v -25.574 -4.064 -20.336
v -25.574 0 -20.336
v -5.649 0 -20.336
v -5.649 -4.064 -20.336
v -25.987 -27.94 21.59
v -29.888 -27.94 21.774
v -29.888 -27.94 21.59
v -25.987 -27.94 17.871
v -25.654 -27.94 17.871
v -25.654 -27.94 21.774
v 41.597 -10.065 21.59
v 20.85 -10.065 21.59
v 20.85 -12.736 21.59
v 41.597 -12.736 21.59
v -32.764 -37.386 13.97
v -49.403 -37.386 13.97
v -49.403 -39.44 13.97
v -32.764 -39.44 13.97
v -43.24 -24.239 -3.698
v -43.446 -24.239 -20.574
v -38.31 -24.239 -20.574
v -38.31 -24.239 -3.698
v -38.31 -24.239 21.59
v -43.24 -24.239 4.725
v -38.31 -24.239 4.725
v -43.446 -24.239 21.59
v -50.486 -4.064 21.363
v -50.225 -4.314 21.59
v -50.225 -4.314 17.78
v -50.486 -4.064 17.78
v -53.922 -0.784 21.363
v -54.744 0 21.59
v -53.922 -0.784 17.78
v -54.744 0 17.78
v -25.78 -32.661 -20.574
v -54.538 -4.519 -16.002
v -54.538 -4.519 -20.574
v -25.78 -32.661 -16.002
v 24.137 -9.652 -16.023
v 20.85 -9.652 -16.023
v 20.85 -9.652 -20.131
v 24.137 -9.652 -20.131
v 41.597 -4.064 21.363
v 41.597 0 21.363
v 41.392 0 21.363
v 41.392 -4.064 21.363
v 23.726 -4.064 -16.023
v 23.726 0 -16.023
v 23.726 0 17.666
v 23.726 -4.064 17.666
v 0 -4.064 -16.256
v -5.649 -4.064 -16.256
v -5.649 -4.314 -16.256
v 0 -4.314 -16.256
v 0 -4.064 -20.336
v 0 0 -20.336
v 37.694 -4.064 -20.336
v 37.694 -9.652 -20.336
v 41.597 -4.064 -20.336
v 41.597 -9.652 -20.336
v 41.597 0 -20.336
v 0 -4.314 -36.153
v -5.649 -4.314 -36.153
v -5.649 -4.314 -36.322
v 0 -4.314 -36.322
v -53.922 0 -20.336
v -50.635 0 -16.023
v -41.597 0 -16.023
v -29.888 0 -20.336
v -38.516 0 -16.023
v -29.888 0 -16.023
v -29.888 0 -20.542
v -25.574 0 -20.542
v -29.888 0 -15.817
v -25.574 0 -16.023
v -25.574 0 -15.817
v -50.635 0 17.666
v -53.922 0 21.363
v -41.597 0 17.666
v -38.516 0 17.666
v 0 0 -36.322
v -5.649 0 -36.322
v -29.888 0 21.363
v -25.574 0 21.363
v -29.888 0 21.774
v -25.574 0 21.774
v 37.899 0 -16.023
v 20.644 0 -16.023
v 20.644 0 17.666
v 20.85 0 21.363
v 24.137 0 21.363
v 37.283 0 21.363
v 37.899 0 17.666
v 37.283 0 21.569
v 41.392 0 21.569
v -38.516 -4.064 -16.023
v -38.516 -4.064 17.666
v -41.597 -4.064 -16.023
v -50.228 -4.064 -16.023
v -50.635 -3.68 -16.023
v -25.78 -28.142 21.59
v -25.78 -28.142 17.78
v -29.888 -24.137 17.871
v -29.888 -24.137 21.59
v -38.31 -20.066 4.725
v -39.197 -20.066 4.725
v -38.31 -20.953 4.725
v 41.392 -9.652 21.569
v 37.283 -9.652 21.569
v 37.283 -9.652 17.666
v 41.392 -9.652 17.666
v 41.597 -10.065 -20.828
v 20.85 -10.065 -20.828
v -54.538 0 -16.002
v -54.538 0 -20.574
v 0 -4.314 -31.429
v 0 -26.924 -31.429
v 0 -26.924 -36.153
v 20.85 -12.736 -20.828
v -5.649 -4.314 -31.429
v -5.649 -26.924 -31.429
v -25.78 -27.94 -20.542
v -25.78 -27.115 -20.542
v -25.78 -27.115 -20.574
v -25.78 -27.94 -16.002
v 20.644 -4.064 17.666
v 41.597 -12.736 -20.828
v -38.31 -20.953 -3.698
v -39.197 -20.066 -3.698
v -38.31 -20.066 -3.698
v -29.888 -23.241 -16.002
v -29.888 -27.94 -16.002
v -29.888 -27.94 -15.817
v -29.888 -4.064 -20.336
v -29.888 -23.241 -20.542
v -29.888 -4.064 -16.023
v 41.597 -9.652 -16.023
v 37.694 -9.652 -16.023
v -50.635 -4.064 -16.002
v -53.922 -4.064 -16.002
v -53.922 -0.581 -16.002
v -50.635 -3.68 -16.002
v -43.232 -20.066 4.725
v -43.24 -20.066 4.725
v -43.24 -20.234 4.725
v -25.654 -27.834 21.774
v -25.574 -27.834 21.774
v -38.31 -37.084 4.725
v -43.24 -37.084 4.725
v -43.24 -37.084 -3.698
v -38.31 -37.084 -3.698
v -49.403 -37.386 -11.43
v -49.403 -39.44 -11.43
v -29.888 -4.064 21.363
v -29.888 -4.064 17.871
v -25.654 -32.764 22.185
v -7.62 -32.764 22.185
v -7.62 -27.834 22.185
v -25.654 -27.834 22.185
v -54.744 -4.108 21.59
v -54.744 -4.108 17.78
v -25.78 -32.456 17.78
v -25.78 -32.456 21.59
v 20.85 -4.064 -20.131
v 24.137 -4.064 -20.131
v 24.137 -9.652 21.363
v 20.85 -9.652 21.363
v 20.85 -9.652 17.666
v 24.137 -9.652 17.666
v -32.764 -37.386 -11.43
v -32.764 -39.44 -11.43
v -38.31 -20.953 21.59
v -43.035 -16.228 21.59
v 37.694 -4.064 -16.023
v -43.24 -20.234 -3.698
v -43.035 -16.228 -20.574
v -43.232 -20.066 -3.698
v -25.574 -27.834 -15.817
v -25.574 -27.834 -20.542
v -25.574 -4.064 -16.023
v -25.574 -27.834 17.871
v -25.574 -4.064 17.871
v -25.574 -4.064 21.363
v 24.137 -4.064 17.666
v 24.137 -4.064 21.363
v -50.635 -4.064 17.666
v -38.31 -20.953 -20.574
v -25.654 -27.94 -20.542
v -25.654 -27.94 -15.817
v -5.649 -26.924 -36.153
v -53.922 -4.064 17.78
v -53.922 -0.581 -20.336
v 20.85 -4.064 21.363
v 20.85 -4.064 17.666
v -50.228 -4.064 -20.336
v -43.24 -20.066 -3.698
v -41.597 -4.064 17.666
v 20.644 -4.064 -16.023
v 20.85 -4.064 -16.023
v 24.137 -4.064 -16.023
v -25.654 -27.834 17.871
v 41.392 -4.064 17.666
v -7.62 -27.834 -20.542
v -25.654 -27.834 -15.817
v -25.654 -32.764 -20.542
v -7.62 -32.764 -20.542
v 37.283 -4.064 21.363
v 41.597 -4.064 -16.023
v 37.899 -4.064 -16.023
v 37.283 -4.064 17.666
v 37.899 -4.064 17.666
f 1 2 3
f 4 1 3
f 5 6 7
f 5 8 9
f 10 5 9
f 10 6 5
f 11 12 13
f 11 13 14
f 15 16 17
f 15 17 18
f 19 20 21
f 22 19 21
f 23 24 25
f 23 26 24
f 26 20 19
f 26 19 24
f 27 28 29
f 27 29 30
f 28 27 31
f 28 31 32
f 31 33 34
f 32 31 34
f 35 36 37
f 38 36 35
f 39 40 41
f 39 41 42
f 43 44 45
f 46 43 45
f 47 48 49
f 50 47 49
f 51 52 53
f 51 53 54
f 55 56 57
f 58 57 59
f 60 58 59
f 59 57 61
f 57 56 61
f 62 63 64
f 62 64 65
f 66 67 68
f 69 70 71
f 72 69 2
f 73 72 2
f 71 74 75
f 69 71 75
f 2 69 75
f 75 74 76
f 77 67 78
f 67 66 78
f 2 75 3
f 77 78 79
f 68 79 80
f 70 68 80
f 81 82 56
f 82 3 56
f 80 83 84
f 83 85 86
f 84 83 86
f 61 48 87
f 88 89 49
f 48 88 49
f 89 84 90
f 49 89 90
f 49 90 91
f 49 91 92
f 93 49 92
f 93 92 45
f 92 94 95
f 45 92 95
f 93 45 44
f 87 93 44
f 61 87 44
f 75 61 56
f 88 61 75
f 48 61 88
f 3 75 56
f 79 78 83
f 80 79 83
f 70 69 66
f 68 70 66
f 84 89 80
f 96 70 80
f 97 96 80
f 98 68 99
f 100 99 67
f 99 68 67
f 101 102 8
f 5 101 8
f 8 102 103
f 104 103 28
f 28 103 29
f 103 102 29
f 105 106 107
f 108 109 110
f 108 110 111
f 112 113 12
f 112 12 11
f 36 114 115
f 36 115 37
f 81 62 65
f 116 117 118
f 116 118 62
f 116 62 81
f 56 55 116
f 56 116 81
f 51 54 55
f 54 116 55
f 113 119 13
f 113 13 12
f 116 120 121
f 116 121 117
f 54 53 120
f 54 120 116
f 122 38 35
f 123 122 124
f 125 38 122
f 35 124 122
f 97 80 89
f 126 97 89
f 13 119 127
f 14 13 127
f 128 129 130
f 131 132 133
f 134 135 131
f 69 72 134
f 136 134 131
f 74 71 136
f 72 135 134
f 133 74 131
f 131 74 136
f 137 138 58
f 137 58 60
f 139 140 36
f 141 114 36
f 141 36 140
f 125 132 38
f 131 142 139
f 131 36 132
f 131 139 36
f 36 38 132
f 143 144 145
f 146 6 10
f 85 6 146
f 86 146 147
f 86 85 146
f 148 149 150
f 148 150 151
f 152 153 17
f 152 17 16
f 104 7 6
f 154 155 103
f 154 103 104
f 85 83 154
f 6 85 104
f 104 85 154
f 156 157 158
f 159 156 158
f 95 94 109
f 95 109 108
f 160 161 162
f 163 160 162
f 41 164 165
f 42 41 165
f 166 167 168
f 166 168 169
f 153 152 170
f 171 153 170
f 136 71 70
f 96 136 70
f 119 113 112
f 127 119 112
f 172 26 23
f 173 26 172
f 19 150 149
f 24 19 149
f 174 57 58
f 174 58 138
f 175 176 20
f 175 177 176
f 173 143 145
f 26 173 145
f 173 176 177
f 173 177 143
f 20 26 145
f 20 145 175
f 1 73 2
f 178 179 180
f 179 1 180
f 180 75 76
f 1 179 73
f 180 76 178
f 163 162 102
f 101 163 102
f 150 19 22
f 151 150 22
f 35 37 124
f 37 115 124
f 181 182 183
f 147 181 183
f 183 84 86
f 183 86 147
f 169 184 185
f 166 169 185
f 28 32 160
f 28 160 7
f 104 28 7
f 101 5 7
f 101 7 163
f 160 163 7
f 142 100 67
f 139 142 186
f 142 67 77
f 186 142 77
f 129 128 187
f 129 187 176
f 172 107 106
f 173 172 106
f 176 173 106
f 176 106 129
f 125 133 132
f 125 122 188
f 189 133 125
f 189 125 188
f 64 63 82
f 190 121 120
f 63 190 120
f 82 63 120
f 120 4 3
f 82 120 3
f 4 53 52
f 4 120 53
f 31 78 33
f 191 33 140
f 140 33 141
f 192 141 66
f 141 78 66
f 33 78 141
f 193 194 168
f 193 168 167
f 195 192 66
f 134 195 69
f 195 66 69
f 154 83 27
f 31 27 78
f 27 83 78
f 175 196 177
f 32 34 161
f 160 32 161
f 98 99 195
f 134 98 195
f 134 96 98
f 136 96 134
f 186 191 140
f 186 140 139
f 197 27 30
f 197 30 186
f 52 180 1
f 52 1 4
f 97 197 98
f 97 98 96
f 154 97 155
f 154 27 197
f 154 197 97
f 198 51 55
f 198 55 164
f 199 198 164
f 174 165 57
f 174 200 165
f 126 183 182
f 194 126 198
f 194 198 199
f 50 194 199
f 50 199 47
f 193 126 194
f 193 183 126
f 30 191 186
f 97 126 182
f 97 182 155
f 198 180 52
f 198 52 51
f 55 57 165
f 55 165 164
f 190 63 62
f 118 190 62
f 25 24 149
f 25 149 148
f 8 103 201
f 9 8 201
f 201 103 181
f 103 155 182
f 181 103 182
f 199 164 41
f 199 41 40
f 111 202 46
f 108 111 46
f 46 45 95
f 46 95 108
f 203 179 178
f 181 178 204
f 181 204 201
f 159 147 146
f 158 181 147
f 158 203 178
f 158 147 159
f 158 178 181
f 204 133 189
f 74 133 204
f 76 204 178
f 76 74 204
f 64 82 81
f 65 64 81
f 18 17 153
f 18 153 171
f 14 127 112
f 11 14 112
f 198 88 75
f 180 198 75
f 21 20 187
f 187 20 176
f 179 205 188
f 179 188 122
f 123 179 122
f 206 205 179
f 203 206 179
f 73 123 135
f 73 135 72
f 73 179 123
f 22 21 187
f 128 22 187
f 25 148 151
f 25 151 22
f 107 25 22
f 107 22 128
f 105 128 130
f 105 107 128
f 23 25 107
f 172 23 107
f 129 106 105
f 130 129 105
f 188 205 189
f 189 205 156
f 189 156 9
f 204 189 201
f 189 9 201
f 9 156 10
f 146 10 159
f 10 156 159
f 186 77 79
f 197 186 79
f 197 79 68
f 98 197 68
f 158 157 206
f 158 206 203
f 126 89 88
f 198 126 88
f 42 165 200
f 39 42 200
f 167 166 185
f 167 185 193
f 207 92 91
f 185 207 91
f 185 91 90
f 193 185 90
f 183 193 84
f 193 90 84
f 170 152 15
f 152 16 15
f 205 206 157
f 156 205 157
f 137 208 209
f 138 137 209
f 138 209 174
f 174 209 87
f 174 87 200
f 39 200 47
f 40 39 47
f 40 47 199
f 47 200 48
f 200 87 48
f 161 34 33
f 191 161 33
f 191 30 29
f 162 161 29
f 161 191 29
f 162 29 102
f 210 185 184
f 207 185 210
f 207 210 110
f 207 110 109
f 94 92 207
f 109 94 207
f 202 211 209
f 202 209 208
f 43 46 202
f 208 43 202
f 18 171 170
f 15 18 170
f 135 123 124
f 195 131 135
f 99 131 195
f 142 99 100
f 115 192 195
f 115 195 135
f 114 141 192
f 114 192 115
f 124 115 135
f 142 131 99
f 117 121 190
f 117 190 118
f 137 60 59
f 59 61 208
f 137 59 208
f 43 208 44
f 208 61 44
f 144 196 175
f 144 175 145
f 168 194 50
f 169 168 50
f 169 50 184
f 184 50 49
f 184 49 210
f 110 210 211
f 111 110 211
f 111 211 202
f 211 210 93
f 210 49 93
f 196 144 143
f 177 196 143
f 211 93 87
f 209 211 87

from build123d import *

# Parameters (mm, degrees)
F0_W           = 3.286678344
F0_H           = 16.0225424916
F0_H_2         = 17.6658798009
F0_W_2         = 3.0812583864
F0_W_3         = 3.0812565237
F0_W_4         = 3.6975108087
F1_DEPTH       = 4.064
F2_W           = 4.3137613684
F2_H           = 4.7245956957
F2_H_2         = 3.9029289037
F3_DEPTH       = 27.94
F5_START       = 17.78
F5_DEPTH       = 3.81
F7_START       = -16.002
F7_DEPTH       = 4.572
F9_START       = -7.62
F8_W           = 4.9300119281
F8_H           = 42.7267793566
F9_DEPTH       = 18.034
F10_W          = 3.9029307663
F10_H          = 4.3137613684
F10_W_2        = 4.1083432734
F10_H_2        = 3.9029251784
F10_W_3        = 3.2866764814
F10_H_3        = 3.6975089461
F10_H_4        = 4.1083432734
F11_DEPTH      = 9.652
F12_W          = 20.7471400499
F12_H          = 2.670424059
F13_DEPTH      = 21.59
F13_DEPTH_BACK = 20.828
F15_START      = -16.256
F14_W          = 5.6489729322
F14_H          = 4.3137613684
F15_DEPTH      = 20.066
F16_W          = 5.6489729322
F16_H          = 4.7245956957
F17_DEPTH      = 26.924
F19_DEPTH      = 21.59
F19_DEPTH_BACK = 20.574
F21_START      = 20.066
F20_W          = 4.9300119281
F20_H          = 8.4221053403
F21_DEPTH      = 17.018
F22_W          = 16.6387930512
F22_H          = 2.0541734993
F23_DEPTH      = 13.97
F23_DEPTH_BACK = 11.43


with BuildPart() as f1:
    # F0 (on Front) → F1 (new body)
    with BuildSketch(Plane.XZ):
        Polygon((-53.9220161736, 21.363388747), (-53.9220161736, 17.6658798009), (-50.6353378296, 17.6658798009), (-41.5969826281, 17.6658798009), (-38.5157242417, 17.6658798009), (20.6444300711, 17.6658798009), (23.7256865948, 17.6658798009), (37.8994755447, 17.6658798009), (41.5969863534, 17.6658798009), (41.5969863534, 21.363388747), align=None)
        Polygon((-50.6353378296, -16.0225424916), (-53.9220161736, -16.0225424916), (-53.9220161736, -20.3363038599), (41.5969863534, -20.3363038599), (41.5969863534, -16.0225424916), (37.8994755447, -16.0225424916), (23.7256865948, -16.0225424916), (20.6444300711, -16.0225424916), (-38.5157242417, -16.0225424916), (-41.5969826281, -16.0225424916), align=None)
        with Locations((-52.2786770016, -8.0112712458)):
            Rectangle(F0_W, F0_H)
        with Locations((-52.2786770016, 8.8329399005)):
            Rectangle(F0_W, F0_H_2)
        with Locations((-40.0563534349, 8.8329399005)):
            Rectangle(F0_W_2, F0_H_2)
        with Locations((-40.0563534349, -8.0112712458)):
            Rectangle(F0_W_2, F0_H)
        with Locations((22.185058333, 8.8329399005)):
            Rectangle(F0_W_3, F0_H_2)
        with Locations((22.185058333, -8.0112712458)):
            Rectangle(F0_W_3, F0_H)
        with Locations((39.748230949, -8.0112712458)):
            Rectangle(F0_W_4, F0_H)
        with Locations((39.748230949, 8.8329399005)):
            Rectangle(F0_W_4, F0_H_2)
    extrude(amount=F1_DEPTH)

    # F2 (on Front) → F3 (join)
    with BuildSketch(Plane.XZ):
        with Locations((-27.7313226834, -18.1794222444)):
            Rectangle(F2_W, F2_H)
        with Locations((-27.7313226834, 19.8227604851)):
            Rectangle(F2_W, F2_H_2)
    extrude(amount=F3_DEPTH)

    # F4 (on Top) → F5 (join)
    with BuildSketch(Plane.XY.offset(F5_START)):
        Polygon((-25.7798600942, -28.1421579421), (-50.2245053649, -4.3137613684), (-54.7436848283, 0), (-54.7436848283, -4.1083442047), (-25.7798600942, -32.4559174478), align=None)
    extrude(amount=F5_DEPTH)

    # F6 (on Top) → F7 (join)
    with BuildSketch(Plane.XY.offset(F7_START)):
        Polygon((-54.5382685959, -4.5191785321), (-25.7798582315, -32.6613374054), (-25.7798582315, -27.1150693297), (-54.5382685959, 0), align=None)
    extrude(amount=-F7_DEPTH)

    # F8 (on Right) → F9 (join)
    with BuildSketch(Plane.YZ.offset(F9_START)):
        with Locations((-30.2990376949, 0.821669586)):
            Rectangle(F8_W, F8_H)
    extrude(amount=-F9_DEPTH)

    # F10 (on Front) → F11 (join)
    with BuildSketch(Plane.XZ):
        with Locations((39.6455209702, -18.1794231758)):
            Rectangle(F10_W, F10_H)
        with Locations((39.3373947591, 19.6173423901)):
            Rectangle(F10_W_2, F10_H_2)
        with Locations((22.4931845441, 19.5146342739)):
            Rectangle(F10_W_3, F10_H_3)
        with Locations((22.4931845441, -18.0767141283)):
            Rectangle(F10_W_3, F10_H_4)
    extrude(amount=F11_DEPTH)

    # F14 (on Top) → F15 (join)
    with BuildSketch(Plane.XY.offset(F15_START)):
        with Locations((-2.8244864661, -2.1568806842)):
            Rectangle(F14_W, F14_H)
    extrude(amount=-F15_DEPTH)

    # F16 (on Front) → F17 (join)
    with BuildSketch(Plane.XZ):
        with Locations((-2.8244864661, -33.7911304086)):
            Rectangle(F16_W, F16_H)
    extrude(amount=F17_DEPTH)


with BuildPart() as f13:
    # F12 (on Top) → F13 (new body, two sides)
    with BuildSketch(Plane.XY) as f13_sk:
        with Locations((31.2234163284, -11.400654912)):
            Rectangle(F12_W, F12_H)
    extrude(amount=F13_DEPTH)
    extrude(f13_sk.sketch, amount=-F13_DEPTH_BACK)


with BuildPart() as f19:
    # F18 (on Top) → F19 (new body, two sides)
    with BuildSketch(Plane.XY) as f19_sk:
        Polygon((-38.3103080094, -20.9525544196), (-43.0349037051, -16.2279587239), (-43.4457398951, -24.2392290384), (-38.3103080094, -24.2392290384), align=None)
    extrude(amount=F19_DEPTH)
    extrude(f19_sk.sketch, amount=-F19_DEPTH_BACK)

    # F20 (on Front) → F21 (join)
    with BuildSketch(Plane.XZ.offset(F21_START)):
        with Locations((-40.7753139734, 0.5135430256)):
            Rectangle(F20_W, F20_H)
    extrude(amount=F21_DEPTH)


with BuildPart() as f23:
    # F22 (on Top) → F23 (new body, two sides)
    with BuildSketch(Plane.XY) as f23_sk:
        with Locations((-41.0834401846, -38.4130161256)):
            Rectangle(F22_W, F22_H)
    extrude(amount=F23_DEPTH)
    extrude(f23_sk.sketch, amount=-F23_DEPTH_BACK)


solid = Compound([f1.part, f13.part, f19.part, f23.part])
